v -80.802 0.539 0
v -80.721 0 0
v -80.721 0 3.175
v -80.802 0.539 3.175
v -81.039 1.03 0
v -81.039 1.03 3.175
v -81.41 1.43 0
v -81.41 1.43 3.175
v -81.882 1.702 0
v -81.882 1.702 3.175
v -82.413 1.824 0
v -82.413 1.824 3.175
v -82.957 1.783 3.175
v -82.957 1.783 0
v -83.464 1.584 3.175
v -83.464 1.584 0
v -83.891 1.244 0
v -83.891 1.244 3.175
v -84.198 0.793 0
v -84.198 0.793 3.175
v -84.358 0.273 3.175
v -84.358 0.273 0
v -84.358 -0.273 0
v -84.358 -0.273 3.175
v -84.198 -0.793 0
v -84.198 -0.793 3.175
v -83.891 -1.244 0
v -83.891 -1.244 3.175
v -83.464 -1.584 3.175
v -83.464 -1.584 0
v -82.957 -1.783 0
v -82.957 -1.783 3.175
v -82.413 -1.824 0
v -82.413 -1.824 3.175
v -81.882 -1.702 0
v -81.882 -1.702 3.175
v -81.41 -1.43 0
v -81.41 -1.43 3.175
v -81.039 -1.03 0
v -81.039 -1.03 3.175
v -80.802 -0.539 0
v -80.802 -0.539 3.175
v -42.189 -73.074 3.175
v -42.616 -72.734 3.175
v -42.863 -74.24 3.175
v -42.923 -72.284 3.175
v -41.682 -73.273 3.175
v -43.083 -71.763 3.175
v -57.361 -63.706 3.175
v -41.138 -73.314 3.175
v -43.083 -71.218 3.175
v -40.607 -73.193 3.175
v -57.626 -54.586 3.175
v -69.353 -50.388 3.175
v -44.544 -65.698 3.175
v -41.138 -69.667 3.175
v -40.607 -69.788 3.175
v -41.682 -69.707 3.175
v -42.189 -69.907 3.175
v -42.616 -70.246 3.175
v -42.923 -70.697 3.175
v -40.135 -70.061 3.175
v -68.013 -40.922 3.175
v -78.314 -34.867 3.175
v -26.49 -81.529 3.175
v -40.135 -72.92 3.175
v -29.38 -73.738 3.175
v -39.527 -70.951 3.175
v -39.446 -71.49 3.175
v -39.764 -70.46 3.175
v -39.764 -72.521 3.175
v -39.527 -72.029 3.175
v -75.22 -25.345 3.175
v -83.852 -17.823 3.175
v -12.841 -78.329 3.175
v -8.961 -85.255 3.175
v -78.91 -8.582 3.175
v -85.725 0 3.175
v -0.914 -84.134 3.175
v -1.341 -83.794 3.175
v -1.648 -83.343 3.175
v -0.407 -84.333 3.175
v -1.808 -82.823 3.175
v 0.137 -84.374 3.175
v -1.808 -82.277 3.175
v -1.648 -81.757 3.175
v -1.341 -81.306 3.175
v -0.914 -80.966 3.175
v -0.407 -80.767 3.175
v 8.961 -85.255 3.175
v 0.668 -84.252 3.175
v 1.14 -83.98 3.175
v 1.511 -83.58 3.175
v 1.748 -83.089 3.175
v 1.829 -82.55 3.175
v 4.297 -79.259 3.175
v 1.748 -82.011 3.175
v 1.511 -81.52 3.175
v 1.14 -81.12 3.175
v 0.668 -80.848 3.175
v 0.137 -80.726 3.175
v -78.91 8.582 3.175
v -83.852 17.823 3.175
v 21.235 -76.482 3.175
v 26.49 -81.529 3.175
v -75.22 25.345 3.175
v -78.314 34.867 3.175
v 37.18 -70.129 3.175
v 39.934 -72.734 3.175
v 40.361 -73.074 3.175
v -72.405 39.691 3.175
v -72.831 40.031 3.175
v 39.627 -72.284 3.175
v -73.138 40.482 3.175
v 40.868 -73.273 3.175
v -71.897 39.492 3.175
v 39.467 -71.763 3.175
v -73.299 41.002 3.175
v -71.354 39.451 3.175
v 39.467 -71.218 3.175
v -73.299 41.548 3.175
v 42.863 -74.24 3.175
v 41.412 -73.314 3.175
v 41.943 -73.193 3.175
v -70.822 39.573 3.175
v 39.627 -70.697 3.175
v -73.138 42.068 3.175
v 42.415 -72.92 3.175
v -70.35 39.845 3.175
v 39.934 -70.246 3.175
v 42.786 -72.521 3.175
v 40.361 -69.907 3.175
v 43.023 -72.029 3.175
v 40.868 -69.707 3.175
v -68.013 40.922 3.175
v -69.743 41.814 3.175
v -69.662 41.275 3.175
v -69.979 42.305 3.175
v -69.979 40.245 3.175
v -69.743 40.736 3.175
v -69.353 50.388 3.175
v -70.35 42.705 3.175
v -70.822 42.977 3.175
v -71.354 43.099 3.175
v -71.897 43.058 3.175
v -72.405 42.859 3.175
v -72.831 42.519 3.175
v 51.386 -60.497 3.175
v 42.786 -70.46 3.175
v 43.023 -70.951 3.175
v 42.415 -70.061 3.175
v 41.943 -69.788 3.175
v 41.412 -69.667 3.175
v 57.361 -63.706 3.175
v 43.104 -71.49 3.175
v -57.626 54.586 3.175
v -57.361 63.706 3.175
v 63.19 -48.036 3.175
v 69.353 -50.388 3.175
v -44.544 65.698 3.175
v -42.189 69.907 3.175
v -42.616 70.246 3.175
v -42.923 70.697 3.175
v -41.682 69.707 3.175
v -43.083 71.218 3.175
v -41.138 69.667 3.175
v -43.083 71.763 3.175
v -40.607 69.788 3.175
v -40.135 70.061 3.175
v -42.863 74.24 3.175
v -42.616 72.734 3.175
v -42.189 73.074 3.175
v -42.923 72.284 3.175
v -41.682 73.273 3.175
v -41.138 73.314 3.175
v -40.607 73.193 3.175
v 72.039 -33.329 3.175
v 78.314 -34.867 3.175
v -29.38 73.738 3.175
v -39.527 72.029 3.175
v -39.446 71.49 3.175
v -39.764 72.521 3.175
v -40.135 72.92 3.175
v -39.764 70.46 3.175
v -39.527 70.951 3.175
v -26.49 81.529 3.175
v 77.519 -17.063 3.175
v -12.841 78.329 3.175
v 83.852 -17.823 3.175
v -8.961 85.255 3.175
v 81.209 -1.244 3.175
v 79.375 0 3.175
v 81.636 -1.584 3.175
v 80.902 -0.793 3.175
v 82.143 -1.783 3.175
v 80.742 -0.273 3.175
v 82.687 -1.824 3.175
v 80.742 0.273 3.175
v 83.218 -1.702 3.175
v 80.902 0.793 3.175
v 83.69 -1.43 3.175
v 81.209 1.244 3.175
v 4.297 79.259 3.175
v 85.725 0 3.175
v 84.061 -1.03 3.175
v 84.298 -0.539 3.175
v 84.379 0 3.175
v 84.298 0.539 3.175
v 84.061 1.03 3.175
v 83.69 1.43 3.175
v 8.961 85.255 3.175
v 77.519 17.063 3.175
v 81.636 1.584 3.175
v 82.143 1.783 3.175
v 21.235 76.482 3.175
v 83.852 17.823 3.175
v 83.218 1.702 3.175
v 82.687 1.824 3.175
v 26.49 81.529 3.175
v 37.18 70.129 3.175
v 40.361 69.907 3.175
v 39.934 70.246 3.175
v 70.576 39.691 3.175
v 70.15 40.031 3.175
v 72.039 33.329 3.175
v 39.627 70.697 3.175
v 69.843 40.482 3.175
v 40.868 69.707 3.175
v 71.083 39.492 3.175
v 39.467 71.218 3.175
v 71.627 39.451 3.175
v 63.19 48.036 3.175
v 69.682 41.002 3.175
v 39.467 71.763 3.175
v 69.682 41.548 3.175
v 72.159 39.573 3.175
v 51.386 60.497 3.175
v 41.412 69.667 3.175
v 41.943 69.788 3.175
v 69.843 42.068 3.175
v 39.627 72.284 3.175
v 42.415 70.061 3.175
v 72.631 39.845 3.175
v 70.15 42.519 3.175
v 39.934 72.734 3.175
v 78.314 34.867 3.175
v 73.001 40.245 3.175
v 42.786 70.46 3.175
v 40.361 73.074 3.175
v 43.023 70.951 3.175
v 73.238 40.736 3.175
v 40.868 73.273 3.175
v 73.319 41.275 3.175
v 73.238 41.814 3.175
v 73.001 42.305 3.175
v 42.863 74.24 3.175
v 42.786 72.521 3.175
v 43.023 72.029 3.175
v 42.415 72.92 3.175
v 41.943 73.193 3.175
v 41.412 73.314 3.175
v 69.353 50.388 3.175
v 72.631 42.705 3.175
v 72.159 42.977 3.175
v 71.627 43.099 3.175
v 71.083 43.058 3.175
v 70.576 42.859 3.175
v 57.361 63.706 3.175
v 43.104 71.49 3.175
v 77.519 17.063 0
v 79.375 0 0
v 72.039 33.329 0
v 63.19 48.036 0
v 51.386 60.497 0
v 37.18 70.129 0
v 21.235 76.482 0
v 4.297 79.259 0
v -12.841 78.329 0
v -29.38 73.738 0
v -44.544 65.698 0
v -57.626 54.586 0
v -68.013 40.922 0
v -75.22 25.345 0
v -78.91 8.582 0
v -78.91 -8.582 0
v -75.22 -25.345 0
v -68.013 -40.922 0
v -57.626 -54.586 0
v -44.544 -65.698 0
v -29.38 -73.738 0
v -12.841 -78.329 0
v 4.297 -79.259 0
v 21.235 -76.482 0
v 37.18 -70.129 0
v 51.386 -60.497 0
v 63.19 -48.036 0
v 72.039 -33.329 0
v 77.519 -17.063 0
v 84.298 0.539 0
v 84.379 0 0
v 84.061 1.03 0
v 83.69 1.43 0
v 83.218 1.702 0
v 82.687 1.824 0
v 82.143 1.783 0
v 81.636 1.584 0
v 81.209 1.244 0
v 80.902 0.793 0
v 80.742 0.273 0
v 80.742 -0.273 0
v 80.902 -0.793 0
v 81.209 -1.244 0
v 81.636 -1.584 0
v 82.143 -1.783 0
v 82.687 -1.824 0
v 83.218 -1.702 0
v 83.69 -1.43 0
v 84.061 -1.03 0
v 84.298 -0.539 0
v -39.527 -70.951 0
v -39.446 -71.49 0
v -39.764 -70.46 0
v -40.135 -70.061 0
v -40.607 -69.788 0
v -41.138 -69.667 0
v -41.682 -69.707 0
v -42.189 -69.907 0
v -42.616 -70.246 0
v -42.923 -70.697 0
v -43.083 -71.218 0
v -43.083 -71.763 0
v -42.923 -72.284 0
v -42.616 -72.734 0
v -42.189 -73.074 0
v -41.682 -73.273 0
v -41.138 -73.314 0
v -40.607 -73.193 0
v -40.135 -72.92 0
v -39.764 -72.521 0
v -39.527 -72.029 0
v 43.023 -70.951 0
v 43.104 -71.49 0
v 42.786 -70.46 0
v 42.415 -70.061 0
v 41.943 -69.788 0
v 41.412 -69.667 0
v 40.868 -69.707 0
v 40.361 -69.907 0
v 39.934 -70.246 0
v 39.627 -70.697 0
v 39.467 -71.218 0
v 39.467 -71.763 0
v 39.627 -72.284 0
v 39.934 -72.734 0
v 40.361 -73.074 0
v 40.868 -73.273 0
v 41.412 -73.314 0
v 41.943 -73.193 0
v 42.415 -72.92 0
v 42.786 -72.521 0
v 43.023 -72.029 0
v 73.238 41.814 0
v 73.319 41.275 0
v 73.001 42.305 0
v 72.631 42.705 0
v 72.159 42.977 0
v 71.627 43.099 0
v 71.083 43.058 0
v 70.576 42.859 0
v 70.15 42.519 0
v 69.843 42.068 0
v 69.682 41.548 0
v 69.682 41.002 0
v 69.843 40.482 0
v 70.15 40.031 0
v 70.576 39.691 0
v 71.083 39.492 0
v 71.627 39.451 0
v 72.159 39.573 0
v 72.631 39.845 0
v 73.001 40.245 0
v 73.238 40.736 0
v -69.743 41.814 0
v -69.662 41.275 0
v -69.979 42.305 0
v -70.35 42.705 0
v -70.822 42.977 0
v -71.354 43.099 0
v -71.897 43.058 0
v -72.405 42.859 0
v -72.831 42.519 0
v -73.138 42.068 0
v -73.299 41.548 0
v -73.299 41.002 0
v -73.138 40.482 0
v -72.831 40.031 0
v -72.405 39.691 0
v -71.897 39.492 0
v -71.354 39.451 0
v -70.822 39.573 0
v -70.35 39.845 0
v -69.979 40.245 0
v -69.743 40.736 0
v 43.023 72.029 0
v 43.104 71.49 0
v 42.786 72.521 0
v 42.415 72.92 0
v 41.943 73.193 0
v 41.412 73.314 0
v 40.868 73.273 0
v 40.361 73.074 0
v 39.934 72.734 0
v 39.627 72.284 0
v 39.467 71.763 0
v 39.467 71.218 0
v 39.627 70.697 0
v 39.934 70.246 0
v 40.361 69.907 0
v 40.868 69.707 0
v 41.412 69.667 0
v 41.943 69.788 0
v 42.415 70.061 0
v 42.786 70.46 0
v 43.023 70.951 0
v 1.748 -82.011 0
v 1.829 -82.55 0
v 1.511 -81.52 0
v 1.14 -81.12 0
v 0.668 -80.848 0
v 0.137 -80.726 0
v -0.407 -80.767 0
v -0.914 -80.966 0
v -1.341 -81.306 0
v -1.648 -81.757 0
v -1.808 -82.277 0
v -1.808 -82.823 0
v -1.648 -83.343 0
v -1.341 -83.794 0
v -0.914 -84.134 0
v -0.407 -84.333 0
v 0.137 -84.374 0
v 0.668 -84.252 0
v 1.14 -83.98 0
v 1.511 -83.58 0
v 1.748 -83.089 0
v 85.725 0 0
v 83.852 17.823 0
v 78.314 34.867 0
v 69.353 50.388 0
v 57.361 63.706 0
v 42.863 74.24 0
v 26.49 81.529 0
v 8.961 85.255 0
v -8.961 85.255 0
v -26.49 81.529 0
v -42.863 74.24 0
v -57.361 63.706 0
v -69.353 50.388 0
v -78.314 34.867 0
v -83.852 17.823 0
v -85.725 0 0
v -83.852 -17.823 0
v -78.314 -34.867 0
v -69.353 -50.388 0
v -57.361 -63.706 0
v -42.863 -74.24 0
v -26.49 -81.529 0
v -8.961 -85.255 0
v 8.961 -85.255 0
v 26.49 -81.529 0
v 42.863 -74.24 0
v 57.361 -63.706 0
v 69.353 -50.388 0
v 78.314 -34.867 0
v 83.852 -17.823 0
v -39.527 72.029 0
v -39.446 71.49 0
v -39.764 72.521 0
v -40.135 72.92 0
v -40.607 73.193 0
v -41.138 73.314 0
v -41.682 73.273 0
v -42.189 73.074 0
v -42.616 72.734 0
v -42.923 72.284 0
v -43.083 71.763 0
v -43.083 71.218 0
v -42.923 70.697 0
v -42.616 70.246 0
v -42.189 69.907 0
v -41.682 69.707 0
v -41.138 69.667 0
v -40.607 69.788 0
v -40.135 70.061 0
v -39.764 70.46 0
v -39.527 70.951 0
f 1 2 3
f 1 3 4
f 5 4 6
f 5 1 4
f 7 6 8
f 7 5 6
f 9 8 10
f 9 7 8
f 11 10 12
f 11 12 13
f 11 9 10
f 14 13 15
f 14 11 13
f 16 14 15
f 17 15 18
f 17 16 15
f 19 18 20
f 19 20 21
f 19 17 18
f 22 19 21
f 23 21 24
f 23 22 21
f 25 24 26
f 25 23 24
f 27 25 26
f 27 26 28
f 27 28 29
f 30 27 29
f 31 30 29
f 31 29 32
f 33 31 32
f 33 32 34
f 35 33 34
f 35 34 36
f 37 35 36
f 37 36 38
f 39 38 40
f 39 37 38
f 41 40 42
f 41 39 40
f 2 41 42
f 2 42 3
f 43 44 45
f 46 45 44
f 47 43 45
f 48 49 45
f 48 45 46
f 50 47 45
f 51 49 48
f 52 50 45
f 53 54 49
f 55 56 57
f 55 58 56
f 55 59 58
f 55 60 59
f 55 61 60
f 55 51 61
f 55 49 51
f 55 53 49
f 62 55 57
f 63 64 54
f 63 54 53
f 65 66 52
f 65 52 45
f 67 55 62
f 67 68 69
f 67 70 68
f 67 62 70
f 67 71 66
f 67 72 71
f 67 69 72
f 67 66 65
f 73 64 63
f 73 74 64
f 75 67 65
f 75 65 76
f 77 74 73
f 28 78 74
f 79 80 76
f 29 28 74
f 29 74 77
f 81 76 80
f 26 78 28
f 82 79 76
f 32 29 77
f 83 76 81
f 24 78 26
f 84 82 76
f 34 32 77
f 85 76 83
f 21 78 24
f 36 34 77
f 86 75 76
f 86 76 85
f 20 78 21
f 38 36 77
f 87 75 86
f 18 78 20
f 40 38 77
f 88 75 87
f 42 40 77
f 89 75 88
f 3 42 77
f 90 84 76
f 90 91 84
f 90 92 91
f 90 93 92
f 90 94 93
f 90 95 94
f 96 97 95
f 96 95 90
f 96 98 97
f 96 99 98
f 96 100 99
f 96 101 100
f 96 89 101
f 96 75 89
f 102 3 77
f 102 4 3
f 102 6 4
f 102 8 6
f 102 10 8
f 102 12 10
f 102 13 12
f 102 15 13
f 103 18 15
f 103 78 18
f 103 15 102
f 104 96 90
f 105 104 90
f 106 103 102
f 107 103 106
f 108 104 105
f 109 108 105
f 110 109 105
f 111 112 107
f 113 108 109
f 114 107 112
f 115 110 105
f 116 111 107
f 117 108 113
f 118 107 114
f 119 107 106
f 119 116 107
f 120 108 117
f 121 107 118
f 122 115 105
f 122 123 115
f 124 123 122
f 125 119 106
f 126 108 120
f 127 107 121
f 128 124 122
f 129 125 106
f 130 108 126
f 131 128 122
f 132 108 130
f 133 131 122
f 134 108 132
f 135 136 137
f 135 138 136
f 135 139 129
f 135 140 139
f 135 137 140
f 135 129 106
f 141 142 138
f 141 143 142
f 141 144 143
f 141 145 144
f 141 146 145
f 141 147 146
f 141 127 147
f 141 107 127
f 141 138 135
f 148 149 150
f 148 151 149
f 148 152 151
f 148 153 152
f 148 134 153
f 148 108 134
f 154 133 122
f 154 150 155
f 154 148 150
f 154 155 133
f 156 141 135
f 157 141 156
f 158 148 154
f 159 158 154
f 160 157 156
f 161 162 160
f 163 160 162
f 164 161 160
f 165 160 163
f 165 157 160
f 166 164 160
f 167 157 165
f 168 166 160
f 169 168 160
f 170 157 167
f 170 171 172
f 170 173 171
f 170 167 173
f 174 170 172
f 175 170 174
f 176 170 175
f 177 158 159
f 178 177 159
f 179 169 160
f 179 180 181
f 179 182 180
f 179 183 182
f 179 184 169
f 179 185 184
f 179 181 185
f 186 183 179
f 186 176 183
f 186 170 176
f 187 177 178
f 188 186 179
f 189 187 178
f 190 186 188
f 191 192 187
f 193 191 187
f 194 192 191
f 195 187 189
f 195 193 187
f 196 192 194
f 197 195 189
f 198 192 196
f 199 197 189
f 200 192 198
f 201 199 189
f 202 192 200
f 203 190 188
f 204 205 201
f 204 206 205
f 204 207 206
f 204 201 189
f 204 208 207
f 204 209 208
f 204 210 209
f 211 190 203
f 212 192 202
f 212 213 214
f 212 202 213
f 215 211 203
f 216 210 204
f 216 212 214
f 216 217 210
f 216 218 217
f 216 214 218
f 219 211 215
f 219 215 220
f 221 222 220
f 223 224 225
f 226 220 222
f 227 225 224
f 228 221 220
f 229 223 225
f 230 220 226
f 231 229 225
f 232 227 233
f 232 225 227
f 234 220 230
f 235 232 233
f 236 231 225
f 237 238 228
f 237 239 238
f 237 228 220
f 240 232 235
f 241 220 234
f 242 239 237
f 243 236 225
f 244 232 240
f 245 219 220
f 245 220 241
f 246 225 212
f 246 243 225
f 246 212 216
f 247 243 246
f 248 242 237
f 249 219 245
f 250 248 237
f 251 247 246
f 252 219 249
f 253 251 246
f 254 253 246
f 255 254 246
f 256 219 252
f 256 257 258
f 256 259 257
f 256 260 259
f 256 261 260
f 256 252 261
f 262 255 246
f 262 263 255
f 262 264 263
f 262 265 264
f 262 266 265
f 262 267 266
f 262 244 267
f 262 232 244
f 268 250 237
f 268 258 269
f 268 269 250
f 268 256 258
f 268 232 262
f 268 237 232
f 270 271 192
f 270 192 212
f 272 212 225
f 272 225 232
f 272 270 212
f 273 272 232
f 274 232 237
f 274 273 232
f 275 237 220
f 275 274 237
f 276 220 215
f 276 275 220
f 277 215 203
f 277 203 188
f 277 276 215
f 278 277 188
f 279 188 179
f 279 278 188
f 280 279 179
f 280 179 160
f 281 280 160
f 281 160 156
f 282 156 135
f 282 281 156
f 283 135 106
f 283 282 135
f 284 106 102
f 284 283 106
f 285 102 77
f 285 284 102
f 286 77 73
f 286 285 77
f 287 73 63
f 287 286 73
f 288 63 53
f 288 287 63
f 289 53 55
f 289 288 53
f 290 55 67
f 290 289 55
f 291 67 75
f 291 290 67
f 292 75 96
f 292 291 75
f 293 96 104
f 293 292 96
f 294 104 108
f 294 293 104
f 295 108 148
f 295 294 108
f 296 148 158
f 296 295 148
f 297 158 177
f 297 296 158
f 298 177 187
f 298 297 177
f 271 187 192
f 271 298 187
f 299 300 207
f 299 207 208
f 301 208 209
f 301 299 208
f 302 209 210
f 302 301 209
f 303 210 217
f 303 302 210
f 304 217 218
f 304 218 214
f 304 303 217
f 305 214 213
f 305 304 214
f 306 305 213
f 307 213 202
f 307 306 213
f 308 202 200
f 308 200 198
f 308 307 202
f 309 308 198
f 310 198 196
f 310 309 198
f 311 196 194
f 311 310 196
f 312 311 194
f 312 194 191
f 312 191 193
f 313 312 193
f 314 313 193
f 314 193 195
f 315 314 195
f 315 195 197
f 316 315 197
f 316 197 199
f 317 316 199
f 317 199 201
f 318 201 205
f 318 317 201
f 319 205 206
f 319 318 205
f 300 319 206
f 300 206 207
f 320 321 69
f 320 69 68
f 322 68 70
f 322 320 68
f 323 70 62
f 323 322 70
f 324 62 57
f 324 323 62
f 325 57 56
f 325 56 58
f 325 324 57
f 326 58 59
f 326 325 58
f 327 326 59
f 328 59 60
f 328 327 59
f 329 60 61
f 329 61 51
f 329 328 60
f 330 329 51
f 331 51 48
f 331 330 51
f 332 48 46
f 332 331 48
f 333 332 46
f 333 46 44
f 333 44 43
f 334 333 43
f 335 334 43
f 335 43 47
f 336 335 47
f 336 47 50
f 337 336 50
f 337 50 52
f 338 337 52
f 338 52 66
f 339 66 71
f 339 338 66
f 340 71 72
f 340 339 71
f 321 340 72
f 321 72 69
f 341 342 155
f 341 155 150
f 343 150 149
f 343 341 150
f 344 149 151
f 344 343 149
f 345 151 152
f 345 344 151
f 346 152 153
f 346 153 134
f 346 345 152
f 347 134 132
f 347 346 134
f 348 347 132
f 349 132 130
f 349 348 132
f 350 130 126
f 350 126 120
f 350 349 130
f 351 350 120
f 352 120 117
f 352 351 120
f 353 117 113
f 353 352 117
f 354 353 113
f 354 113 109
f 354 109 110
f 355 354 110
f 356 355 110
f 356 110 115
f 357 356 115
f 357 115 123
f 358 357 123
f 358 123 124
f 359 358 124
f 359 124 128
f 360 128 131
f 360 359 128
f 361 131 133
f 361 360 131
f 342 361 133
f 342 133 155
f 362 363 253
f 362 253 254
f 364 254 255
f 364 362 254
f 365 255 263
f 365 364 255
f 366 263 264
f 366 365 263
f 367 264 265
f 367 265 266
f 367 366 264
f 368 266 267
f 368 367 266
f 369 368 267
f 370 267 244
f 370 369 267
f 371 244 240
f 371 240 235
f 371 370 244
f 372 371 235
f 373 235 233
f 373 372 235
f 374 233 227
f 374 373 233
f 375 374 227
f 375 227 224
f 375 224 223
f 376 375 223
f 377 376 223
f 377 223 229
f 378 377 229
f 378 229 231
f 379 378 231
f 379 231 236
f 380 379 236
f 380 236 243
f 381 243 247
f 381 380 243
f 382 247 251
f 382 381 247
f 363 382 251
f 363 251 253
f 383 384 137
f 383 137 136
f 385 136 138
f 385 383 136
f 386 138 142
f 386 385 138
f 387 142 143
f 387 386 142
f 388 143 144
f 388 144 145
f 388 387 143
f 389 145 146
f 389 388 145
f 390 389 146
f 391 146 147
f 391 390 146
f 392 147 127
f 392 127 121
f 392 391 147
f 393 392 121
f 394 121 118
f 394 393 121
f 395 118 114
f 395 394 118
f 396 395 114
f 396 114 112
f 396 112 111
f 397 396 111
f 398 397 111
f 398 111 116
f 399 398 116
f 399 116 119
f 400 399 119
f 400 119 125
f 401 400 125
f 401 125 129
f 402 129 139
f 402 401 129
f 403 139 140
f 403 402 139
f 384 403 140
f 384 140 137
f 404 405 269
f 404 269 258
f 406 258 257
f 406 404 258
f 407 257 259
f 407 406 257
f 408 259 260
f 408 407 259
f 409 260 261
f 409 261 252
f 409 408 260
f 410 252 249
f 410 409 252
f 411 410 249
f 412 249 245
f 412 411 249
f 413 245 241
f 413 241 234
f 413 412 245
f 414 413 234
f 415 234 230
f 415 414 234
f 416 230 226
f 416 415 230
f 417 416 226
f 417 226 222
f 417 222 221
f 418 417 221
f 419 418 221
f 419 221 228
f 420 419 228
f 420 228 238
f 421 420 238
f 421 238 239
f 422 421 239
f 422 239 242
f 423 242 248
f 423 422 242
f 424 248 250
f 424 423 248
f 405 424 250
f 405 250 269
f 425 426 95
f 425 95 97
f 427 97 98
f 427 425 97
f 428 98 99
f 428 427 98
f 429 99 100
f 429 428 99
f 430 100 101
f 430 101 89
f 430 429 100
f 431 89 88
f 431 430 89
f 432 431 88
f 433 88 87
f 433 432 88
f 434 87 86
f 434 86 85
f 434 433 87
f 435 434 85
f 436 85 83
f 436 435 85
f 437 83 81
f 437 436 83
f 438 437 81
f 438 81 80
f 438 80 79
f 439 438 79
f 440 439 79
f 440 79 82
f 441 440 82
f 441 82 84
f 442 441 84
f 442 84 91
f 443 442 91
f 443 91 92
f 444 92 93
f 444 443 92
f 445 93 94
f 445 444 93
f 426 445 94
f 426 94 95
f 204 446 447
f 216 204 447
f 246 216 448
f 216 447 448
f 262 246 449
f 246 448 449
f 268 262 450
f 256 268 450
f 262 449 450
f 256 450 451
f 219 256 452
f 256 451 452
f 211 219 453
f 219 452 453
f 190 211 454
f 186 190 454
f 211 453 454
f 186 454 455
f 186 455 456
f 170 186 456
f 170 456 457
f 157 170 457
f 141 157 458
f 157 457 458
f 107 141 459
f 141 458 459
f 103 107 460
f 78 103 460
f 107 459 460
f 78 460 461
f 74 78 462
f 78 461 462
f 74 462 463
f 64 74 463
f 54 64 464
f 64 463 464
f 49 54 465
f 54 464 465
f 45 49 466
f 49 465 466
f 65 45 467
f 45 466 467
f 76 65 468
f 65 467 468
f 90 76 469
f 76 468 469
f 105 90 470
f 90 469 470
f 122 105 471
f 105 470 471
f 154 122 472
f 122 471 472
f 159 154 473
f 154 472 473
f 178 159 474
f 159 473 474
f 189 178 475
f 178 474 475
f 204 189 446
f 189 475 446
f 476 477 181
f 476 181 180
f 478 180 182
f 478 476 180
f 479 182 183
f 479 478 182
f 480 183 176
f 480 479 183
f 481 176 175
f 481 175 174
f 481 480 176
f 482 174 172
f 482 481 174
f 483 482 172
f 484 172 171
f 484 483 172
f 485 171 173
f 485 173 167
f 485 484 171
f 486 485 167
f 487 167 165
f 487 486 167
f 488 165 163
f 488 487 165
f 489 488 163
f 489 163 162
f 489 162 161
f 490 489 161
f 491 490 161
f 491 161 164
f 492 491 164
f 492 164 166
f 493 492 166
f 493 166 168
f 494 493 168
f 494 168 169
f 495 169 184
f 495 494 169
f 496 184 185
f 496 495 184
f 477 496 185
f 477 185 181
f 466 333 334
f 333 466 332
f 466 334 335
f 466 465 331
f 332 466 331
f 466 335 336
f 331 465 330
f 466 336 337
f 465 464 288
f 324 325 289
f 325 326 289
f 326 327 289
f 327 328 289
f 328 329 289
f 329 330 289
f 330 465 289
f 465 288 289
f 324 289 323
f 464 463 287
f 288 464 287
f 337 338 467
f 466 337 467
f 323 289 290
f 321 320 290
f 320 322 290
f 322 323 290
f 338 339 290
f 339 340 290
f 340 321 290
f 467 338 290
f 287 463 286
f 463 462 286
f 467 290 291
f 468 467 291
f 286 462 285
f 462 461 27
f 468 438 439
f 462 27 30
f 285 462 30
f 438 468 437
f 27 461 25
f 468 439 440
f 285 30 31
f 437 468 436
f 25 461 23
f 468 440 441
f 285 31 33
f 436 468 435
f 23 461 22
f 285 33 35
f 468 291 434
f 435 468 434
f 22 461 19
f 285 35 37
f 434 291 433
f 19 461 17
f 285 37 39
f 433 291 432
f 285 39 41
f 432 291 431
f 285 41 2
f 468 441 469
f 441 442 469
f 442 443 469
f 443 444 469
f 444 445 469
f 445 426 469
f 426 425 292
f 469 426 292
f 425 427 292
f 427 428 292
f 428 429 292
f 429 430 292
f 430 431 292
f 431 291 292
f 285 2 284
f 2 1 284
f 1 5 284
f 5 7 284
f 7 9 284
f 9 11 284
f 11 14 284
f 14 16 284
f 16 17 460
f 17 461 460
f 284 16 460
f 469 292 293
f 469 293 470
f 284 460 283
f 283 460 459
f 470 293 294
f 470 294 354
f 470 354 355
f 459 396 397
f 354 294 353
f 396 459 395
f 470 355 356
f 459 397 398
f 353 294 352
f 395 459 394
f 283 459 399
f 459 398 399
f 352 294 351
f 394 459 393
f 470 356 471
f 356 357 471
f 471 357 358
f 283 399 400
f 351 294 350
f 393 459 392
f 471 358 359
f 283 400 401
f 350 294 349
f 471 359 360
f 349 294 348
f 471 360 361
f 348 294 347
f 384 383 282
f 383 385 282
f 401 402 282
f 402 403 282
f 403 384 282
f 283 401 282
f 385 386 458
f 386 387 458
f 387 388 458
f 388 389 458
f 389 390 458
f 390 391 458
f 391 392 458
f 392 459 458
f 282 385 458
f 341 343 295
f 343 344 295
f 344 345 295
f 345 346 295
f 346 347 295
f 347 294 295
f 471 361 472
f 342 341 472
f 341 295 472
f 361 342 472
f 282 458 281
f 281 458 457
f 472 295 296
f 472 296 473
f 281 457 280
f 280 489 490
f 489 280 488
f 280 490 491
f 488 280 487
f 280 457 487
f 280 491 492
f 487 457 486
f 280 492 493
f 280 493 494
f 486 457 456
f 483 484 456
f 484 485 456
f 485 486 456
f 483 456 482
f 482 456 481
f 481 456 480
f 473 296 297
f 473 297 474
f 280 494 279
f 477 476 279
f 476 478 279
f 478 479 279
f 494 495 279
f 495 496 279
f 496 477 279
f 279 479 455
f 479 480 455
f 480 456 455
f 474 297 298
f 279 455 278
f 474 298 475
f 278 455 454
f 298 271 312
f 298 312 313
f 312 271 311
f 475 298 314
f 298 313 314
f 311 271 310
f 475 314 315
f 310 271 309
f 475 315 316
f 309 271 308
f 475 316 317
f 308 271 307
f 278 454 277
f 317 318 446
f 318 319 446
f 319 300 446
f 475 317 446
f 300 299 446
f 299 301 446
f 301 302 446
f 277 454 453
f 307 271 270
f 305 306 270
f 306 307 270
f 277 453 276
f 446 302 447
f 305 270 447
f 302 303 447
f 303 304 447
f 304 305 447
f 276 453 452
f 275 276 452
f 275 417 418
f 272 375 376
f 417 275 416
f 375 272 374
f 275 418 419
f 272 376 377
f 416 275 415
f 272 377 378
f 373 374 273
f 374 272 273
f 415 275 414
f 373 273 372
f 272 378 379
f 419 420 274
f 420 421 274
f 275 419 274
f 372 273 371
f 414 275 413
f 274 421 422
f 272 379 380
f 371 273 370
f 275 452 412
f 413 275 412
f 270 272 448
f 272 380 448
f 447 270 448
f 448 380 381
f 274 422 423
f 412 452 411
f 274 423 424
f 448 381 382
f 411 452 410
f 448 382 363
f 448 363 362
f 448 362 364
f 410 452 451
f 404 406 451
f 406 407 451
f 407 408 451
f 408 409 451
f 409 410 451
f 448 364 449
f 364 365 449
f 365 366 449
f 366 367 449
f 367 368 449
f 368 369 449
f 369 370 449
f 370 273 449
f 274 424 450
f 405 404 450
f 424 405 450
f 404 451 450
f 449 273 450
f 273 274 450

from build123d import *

# Parameters (mm, degrees)
F0_R     = 85.725
F0_R_2   = 1.8288
F0_R_3   = 79.375
F1_DEPTH = 3.175


with BuildPart() as f1:
    # F0 (on Top) → F1 (new body)
    with BuildSketch(Plane.XY):
        Circle(F0_R)
        with Locations((-41.275, -71.490397)):
            Circle(F0_R_2, mode=Mode.SUBTRACT)
        with Locations((0, -82.55)):
            Circle(F0_R_2, mode=Mode.SUBTRACT)
        with Locations((41.275, -71.490397)):
            Circle(F0_R_2, mode=Mode.SUBTRACT)
        with Locations((-82.55, 0)):
            Circle(F0_R_2, mode=Mode.SUBTRACT)
        with Locations((-71.490397, 41.275)):
            Circle(F0_R_2, mode=Mode.SUBTRACT)
        with Locations((-41.275, 71.490397)):
            Circle(F0_R_2, mode=Mode.SUBTRACT)
        Circle(F0_R_3, mode=Mode.SUBTRACT)
        with Locations((82.55, 0)):
            Circle(F0_R_2, mode=Mode.SUBTRACT)
        with Locations((71.490397, 41.275)):
            Circle(F0_R_2, mode=Mode.SUBTRACT)
        with Locations((41.275, 71.490397)):
            Circle(F0_R_2, mode=Mode.SUBTRACT)
    extrude(amount=F1_DEPTH)


solid = f1.part
